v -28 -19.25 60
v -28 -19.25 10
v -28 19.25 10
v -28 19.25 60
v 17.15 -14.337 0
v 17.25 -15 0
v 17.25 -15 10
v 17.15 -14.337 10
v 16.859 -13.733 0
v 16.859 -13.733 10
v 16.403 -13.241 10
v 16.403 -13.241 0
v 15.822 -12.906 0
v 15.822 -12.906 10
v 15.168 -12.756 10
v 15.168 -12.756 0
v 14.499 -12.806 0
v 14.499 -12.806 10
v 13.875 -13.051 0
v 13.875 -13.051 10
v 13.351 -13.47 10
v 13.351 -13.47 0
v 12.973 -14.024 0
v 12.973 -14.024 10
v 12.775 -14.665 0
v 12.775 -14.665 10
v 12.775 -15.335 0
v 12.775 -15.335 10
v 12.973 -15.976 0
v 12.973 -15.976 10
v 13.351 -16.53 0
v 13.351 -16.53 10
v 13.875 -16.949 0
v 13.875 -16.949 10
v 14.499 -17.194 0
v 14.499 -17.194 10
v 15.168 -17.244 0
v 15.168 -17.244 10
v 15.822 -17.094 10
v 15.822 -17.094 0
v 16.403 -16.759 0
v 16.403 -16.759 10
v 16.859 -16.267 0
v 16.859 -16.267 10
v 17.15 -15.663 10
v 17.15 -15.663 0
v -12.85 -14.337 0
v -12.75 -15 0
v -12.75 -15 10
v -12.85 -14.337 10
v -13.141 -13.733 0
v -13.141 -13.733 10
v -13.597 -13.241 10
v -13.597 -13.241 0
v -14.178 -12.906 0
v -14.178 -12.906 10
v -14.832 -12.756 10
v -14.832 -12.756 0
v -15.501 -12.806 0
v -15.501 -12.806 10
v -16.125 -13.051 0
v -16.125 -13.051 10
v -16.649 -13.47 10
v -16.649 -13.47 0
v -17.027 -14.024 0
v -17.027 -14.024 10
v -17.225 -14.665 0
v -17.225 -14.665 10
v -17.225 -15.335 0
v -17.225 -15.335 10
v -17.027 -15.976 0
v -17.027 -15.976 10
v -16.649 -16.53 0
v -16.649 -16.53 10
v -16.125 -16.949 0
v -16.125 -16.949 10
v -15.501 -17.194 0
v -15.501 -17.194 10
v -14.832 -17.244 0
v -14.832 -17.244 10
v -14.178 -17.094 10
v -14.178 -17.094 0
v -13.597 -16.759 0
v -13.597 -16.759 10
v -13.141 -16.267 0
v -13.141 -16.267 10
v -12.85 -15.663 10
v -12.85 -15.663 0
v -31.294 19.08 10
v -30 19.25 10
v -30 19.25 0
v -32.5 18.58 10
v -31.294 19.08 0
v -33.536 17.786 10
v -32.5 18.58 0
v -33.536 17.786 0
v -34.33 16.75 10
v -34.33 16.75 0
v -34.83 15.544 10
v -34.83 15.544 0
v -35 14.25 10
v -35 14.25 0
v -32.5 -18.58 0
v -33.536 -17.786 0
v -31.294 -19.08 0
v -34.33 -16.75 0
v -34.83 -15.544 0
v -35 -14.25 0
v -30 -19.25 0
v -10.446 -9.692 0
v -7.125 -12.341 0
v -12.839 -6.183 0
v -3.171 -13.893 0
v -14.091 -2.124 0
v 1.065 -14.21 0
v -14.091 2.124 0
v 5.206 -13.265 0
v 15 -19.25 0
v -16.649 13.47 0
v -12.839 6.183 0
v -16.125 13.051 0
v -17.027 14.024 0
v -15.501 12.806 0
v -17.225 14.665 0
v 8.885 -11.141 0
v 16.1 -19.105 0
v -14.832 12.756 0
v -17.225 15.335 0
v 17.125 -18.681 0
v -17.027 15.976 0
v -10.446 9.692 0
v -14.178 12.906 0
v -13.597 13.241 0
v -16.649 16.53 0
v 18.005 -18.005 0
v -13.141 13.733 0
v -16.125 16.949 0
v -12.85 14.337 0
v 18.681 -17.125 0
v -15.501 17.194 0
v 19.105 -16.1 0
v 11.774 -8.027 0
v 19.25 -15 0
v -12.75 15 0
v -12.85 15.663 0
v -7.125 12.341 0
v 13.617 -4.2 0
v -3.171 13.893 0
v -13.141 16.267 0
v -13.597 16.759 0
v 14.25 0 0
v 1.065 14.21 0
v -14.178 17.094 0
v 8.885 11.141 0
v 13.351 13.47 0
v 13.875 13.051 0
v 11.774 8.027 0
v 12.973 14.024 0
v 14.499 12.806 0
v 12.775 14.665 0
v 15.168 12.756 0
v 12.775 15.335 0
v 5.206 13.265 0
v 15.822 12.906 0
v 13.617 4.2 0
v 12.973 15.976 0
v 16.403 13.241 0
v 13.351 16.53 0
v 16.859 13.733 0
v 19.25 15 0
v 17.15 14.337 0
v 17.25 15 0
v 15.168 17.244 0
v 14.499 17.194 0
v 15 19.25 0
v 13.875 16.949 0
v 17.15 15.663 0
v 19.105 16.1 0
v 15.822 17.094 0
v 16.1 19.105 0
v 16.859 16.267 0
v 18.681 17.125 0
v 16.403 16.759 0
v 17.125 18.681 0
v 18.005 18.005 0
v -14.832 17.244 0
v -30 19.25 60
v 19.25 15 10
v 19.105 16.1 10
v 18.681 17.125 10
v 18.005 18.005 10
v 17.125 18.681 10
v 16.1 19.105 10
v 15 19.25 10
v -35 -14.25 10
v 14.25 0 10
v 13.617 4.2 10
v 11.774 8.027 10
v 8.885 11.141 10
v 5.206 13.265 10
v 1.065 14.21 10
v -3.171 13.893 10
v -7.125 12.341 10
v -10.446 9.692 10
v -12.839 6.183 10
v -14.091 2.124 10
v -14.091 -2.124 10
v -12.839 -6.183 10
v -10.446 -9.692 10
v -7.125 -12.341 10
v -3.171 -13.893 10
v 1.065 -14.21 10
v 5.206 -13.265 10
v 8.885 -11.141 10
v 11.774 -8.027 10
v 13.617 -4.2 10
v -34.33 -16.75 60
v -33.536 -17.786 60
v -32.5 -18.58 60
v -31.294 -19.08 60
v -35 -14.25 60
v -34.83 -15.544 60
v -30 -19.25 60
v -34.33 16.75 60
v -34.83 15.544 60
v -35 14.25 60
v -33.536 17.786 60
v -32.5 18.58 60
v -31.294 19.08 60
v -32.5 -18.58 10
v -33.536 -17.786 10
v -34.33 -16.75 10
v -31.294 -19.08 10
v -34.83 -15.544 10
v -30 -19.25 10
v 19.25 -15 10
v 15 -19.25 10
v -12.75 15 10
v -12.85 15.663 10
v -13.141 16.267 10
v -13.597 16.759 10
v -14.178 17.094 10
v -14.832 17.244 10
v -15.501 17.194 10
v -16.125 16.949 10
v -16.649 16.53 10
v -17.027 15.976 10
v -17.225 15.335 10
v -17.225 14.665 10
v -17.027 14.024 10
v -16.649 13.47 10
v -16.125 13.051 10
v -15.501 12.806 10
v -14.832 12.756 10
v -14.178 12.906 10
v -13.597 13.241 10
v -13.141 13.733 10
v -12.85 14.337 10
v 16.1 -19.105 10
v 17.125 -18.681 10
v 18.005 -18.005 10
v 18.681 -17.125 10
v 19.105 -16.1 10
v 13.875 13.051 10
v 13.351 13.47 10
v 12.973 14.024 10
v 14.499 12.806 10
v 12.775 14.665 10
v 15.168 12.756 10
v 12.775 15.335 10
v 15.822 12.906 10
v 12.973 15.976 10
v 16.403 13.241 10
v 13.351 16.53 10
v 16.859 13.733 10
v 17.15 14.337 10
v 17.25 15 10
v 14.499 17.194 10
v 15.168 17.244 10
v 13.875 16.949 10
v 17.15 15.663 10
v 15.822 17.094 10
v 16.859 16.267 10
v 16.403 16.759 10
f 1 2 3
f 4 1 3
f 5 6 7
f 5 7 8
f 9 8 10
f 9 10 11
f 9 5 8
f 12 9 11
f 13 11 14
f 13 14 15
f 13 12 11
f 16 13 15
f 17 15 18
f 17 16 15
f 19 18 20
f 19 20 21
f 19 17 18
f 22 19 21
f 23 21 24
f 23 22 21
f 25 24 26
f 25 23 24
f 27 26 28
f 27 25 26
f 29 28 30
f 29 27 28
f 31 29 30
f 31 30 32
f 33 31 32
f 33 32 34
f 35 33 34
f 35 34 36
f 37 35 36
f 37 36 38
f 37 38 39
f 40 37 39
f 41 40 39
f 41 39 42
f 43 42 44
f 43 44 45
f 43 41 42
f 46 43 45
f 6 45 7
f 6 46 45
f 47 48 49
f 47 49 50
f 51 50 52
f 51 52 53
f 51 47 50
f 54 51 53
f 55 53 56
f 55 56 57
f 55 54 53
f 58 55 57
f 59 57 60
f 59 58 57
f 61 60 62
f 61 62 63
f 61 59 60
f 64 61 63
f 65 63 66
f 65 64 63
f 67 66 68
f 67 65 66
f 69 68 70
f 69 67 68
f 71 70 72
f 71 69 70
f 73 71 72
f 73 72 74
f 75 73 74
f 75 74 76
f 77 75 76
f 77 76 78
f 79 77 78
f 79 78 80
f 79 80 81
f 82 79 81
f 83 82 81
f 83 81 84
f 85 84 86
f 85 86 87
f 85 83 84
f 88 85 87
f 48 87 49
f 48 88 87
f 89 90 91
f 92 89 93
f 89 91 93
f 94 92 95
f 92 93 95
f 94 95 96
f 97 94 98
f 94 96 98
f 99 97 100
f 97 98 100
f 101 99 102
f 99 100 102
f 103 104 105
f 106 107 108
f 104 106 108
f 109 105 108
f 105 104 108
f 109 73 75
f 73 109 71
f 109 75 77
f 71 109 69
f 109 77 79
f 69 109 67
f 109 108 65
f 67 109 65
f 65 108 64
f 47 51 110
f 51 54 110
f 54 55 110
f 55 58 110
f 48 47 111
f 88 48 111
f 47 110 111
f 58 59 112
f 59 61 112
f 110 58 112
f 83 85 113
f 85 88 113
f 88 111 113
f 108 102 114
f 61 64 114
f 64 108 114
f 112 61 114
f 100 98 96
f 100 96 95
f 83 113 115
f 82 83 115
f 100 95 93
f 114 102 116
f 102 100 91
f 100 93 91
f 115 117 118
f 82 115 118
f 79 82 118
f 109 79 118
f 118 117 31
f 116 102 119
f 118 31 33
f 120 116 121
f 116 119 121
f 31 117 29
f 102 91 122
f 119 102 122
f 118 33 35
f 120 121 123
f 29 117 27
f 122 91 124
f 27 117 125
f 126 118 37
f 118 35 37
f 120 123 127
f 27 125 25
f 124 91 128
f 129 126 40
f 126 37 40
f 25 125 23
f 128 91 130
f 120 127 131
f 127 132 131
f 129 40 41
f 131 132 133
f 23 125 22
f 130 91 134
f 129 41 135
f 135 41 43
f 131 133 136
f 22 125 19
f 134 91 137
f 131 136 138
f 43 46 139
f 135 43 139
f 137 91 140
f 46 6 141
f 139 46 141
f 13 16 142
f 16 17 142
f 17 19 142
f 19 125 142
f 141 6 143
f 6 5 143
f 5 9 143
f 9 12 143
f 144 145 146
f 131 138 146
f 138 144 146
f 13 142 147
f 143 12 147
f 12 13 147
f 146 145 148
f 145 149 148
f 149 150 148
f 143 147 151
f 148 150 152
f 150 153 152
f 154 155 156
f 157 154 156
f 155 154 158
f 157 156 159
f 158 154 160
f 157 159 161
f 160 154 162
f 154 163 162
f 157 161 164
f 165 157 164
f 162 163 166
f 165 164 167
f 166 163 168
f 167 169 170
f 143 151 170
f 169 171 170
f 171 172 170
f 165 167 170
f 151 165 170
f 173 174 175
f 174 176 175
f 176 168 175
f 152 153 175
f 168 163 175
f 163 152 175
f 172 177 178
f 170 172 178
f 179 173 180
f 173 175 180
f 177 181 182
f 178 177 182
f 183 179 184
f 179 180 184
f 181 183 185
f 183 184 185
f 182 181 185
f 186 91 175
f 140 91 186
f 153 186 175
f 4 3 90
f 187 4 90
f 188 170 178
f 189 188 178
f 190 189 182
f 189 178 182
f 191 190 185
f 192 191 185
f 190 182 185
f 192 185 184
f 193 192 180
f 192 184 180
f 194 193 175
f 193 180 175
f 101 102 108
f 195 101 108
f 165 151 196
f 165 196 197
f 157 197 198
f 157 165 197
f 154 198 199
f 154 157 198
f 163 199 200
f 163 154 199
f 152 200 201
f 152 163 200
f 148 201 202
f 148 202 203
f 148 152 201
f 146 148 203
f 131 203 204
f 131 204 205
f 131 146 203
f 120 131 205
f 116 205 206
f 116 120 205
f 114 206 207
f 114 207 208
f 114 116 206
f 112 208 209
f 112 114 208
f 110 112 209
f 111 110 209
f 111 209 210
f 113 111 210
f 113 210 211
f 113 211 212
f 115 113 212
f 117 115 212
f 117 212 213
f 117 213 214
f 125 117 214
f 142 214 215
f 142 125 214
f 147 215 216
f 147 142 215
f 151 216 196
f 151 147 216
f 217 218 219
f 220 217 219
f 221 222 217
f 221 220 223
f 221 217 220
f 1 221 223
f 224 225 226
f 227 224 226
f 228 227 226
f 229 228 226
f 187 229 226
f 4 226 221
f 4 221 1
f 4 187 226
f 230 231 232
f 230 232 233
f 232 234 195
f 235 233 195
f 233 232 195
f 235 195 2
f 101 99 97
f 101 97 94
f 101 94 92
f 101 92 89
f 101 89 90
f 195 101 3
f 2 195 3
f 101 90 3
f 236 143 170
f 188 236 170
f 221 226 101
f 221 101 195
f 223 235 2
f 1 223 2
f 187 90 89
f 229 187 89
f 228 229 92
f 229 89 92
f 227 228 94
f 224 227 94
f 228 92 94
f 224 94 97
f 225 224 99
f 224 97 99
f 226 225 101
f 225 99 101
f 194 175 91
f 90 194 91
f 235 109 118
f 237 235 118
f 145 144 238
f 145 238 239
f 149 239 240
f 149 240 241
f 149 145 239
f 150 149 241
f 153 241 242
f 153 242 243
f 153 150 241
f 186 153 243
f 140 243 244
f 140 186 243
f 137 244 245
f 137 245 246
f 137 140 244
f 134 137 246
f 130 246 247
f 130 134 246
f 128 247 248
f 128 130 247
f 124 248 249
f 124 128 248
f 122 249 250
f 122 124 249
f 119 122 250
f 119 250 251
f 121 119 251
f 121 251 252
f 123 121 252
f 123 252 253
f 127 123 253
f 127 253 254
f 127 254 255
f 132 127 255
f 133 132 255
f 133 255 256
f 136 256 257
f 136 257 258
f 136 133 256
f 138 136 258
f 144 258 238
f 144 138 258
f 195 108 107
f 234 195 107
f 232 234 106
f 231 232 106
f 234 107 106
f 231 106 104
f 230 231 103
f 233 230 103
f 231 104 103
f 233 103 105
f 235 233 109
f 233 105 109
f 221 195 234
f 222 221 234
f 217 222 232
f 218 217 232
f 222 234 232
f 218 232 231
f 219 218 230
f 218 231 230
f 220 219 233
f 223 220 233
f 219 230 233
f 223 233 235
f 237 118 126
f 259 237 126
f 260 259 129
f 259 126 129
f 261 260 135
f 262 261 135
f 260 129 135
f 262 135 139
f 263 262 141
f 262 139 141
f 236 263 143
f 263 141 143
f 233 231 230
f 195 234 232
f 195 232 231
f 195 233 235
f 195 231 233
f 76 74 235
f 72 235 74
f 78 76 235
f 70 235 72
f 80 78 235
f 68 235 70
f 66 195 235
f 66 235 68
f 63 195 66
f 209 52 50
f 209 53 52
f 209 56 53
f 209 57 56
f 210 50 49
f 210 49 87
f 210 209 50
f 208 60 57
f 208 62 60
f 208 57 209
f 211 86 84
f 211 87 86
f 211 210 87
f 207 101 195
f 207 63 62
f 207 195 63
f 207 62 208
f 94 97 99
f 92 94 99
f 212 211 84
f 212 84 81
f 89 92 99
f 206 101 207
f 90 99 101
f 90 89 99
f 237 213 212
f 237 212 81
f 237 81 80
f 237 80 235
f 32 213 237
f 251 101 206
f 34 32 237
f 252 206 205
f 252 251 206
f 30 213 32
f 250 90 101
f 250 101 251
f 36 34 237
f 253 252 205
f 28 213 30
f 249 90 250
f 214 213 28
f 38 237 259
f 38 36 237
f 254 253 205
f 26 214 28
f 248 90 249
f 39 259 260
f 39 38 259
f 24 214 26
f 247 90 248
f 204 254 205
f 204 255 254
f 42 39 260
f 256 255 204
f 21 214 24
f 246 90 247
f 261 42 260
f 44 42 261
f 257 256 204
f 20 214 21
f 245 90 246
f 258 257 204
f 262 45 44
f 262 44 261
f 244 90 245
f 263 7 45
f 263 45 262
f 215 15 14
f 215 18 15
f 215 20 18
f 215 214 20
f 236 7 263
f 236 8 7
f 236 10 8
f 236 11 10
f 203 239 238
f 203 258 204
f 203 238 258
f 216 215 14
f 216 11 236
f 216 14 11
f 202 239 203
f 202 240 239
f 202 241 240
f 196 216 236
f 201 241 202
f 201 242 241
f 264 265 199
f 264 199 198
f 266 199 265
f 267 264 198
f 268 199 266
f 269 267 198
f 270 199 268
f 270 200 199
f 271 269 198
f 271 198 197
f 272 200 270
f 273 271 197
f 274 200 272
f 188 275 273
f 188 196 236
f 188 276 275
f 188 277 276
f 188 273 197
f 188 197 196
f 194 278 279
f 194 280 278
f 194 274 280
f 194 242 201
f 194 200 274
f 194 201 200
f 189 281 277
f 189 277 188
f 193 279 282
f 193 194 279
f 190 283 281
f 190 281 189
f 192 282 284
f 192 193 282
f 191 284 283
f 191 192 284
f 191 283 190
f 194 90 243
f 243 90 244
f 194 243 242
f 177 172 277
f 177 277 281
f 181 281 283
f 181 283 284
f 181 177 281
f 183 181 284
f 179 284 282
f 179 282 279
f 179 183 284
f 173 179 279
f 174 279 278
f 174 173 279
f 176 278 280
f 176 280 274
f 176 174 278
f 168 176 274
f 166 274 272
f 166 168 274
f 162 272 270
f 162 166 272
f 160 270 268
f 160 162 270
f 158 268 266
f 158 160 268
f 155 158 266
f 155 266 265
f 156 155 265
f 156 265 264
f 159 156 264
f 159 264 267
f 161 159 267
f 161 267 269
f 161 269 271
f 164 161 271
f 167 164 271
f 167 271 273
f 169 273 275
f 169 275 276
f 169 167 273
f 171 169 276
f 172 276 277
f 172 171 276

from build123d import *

# Parameters (mm, degrees)
SKETCH1_R           = 2.25
SKETCH1_R_2         = 14.25
BOSS_EXTRUDE1_DEPTH = 10
BOSS_EXTRUDE3_DEPTH = 50


with BuildPart() as part:
    # Sketch1 → Boss-Extrude1 (new body)
    with BuildSketch(Plane.XY):
        with BuildLine():
            Line((15, 19.25), (-15, 19.25))
            Line((-15, 19.25), (-30, 19.25))
            ThreePointArc((-30, 19.25), (-33.535533906, 17.785533906), (-35, 14.25))
            Line((-35, 14.25), (-35, -14.25))
            ThreePointArc((-35, -14.25), (-33.535533906, -17.785533906), (-30, -19.25))
            Line((-30, -19.25), (-15, -19.25))
            Line((-15, -19.25), (15, -19.25))
            ThreePointArc((15, -19.25), (18.00520382, -18.00520382), (19.25, -15))
            Line((19.25, -15), (19.25, 15))
            ThreePointArc((19.25, 15), (18.00520382, 18.00520382), (15, 19.25))
        make_face()
        with Locations((-15, -15)):
            Circle(SKETCH1_R, mode=Mode.SUBTRACT)
        with Locations((15, -15)):
            Circle(SKETCH1_R, mode=Mode.SUBTRACT)
        with Locations((-15, 15)):
            Circle(SKETCH1_R, mode=Mode.SUBTRACT)
        Circle(SKETCH1_R_2, mode=Mode.SUBTRACT)
        with Locations((15, 15)):
            Circle(SKETCH1_R, mode=Mode.SUBTRACT)
    extrude(amount=BOSS_EXTRUDE1_DEPTH)


with BuildPart() as body_2:
    # Sketch2 → Boss-Extrude3 (new body)
    with BuildSketch(Plane.XY.offset(10)):
        with BuildLine():
            Line((-30, -19.25), (-28, -19.25))
            Line((-28, -19.25), (-28, 0))
            Line((-28, 0), (-28, 19.25))
            Line((-28, 19.25), (-30, 19.25))
            ThreePointArc((-30, 19.25), (-33.535533906, 17.785533906), (-35, 14.25))
            Line((-35, 14.25), (-35, -14.25))
            ThreePointArc((-35, -14.25), (-33.535533906, -17.785533906), (-30, -19.25))
        make_face()
    extrude(amount=BOSS_EXTRUDE3_DEPTH)


solid = Compound([part.part, body_2.part])
